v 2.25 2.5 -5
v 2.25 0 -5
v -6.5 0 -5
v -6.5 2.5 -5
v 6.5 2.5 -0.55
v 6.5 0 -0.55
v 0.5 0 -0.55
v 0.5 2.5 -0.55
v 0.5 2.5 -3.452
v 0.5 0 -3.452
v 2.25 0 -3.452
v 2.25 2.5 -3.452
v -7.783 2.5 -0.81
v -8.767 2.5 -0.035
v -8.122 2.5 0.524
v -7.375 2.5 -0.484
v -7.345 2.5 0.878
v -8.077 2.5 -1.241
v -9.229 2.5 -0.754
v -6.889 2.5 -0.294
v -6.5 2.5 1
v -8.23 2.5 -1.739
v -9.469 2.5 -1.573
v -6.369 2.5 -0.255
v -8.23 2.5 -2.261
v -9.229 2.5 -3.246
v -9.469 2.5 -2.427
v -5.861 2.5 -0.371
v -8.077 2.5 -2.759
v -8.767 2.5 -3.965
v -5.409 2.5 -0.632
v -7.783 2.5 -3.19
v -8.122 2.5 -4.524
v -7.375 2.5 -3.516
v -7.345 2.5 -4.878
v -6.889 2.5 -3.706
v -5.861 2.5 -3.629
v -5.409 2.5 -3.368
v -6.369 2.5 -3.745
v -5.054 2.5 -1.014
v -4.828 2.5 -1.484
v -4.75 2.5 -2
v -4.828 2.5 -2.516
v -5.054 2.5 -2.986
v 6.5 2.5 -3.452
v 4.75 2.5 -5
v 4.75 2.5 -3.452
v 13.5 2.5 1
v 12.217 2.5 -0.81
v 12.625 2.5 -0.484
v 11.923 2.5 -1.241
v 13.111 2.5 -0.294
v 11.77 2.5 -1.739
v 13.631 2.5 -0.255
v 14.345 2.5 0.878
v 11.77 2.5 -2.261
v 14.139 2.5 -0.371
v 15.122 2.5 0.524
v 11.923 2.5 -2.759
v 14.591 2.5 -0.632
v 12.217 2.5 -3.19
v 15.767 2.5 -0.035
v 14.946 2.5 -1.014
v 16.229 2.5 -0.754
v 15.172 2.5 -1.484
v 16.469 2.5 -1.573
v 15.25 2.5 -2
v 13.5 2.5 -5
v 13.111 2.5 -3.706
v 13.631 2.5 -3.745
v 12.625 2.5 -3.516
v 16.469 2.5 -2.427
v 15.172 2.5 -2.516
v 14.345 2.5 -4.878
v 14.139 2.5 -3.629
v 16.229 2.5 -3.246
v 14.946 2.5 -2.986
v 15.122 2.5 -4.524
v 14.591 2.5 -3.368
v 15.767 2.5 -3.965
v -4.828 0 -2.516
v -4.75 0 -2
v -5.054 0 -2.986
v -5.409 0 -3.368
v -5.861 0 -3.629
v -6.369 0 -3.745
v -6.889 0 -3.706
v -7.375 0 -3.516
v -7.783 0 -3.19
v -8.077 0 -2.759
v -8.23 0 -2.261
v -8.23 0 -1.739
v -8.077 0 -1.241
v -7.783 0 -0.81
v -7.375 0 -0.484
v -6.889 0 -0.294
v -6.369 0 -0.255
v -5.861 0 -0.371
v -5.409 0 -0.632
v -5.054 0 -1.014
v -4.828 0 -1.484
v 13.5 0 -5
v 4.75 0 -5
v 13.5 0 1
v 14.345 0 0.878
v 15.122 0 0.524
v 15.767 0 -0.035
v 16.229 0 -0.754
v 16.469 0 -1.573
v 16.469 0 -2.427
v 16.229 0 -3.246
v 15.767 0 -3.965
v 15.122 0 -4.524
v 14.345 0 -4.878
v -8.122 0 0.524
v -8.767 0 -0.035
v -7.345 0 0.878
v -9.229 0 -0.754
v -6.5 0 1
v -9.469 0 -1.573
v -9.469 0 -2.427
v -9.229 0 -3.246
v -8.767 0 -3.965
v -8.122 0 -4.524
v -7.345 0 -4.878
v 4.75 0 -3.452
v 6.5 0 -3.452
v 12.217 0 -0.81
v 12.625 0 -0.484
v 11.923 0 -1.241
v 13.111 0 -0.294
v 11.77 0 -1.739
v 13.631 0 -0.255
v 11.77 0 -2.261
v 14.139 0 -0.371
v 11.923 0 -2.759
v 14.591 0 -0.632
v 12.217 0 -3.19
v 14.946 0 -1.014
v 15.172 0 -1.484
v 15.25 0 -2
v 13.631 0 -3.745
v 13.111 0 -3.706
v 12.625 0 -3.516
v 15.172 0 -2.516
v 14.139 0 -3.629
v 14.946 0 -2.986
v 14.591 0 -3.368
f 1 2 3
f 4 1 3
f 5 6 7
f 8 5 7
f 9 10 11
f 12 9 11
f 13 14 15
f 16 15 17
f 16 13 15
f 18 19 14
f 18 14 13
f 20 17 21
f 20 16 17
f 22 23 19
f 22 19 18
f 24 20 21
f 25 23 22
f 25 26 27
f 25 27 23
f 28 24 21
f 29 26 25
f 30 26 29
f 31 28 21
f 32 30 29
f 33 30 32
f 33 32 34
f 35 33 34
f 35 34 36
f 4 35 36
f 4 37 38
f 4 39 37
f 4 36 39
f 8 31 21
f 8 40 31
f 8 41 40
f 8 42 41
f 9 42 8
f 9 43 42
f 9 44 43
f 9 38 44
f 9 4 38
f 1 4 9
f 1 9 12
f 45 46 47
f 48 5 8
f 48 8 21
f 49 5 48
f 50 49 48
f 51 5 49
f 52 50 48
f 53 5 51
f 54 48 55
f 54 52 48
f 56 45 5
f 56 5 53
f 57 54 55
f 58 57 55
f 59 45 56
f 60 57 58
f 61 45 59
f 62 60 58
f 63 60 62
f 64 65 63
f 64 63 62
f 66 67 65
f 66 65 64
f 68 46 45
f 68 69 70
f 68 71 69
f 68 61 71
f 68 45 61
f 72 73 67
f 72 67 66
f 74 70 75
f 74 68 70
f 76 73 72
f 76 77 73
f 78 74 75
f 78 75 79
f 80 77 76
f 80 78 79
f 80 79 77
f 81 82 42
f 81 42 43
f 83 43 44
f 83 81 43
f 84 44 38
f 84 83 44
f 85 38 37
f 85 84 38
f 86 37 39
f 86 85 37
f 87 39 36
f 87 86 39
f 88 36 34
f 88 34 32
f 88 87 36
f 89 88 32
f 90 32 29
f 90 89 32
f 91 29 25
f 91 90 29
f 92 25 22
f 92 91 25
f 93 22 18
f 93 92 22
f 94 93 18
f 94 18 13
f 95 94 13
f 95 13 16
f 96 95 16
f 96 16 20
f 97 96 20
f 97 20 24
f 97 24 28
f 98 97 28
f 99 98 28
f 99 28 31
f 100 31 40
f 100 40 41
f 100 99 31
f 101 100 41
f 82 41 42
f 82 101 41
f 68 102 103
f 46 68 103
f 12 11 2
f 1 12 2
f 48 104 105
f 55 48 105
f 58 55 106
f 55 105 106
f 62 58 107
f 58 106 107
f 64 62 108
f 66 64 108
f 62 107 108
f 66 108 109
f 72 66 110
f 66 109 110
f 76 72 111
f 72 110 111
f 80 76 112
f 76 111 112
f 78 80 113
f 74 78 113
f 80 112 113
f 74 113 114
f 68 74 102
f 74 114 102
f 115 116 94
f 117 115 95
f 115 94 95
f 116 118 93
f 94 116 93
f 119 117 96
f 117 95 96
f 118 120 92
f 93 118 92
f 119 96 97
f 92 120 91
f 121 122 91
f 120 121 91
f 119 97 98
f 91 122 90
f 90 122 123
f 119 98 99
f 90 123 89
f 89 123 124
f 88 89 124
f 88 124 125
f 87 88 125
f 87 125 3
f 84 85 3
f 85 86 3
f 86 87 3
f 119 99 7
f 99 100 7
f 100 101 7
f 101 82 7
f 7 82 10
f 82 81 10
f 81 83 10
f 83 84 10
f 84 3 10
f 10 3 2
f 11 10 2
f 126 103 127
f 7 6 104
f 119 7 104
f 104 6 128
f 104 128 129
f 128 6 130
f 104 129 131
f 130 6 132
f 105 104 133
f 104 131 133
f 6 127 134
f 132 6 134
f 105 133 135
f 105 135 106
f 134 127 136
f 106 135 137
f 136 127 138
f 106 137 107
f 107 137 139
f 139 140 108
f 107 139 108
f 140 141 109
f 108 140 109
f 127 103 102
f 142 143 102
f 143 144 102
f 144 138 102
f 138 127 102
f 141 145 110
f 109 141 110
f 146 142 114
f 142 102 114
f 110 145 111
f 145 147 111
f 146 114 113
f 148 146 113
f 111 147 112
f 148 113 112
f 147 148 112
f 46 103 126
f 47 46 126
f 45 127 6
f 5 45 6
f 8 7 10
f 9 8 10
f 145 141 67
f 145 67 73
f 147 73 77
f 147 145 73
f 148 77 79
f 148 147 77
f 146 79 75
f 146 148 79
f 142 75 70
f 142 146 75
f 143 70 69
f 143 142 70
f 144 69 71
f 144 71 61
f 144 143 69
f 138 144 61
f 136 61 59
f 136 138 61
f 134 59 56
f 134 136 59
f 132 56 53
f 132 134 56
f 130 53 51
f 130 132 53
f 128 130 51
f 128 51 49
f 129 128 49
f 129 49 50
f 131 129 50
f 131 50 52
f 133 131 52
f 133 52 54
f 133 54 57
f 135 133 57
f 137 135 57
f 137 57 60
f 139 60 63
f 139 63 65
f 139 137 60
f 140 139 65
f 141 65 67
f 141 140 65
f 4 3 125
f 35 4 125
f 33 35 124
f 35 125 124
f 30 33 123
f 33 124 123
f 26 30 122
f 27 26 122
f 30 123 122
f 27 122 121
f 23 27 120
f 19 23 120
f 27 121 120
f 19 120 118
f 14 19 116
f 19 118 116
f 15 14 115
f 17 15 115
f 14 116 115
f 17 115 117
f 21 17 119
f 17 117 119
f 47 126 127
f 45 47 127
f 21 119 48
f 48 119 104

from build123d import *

# Parameters (mm, degrees)
SKETCH1_R           = 3
SKETCH1_R_2         = 1.75
BOSS_EXTRUDE1_DEPTH = 2.5


with BuildPart() as part:
    # Sketch1 → Boss-Extrude1 (new body)
    with BuildSketch(Plane(origin=(0, 0, 0), x_dir=(1, 0, 0), z_dir=(0, 1, 0))):
        with Locations((-6.5, 2)):
            Circle(SKETCH1_R)
        with Locations((-6.5, 2)):
            Circle(SKETCH1_R_2, mode=Mode.SUBTRACT)
        with BuildLine():
            Line((7, 0), (0, 0))
            Line((0, 0), (0, 4))
            Line((0, 4), (2.25, 4))
            Line((2.25, 4), (2.25, 5))
            Line((2.25, 5), (-6.5, 5))
            ThreePointArc((-6.5, 5), (-4.378679656, 4.121320344), (-3.5, 2))
            ThreePointArc((-3.5, 2), (-4.378679656, -0.121320344), (-6.5, -1))
            Line((-6.5, -1), (13.5, -1))
            ThreePointArc((13.5, -1), (10.5, 2), (13.5, 5))
            Line((13.5, 5), (4.75, 5))
            Line((4.75, 5), (4.75, 4))
            Line((4.75, 4), (7, 4))
            Line((7, 4), (7, 0))
        make_face()
        Polygon((2.25, 4), (0, 4), (0, 0), (7, 0), (7, 4), (4.75, 4), (4.75, 3.451807229), (6.5, 3.451807229), (6.5, 0.55), (0.5, 0.55), (0.5, 3.451807229), (2.25, 3.451807229), align=None)
        with Locations((13.5, 2)):
            Circle(SKETCH1_R)
        with Locations((13.5, 2)):
            Circle(SKETCH1_R_2, mode=Mode.SUBTRACT)
    extrude(amount=BOSS_EXTRUDE1_DEPTH)


solid = part.part
